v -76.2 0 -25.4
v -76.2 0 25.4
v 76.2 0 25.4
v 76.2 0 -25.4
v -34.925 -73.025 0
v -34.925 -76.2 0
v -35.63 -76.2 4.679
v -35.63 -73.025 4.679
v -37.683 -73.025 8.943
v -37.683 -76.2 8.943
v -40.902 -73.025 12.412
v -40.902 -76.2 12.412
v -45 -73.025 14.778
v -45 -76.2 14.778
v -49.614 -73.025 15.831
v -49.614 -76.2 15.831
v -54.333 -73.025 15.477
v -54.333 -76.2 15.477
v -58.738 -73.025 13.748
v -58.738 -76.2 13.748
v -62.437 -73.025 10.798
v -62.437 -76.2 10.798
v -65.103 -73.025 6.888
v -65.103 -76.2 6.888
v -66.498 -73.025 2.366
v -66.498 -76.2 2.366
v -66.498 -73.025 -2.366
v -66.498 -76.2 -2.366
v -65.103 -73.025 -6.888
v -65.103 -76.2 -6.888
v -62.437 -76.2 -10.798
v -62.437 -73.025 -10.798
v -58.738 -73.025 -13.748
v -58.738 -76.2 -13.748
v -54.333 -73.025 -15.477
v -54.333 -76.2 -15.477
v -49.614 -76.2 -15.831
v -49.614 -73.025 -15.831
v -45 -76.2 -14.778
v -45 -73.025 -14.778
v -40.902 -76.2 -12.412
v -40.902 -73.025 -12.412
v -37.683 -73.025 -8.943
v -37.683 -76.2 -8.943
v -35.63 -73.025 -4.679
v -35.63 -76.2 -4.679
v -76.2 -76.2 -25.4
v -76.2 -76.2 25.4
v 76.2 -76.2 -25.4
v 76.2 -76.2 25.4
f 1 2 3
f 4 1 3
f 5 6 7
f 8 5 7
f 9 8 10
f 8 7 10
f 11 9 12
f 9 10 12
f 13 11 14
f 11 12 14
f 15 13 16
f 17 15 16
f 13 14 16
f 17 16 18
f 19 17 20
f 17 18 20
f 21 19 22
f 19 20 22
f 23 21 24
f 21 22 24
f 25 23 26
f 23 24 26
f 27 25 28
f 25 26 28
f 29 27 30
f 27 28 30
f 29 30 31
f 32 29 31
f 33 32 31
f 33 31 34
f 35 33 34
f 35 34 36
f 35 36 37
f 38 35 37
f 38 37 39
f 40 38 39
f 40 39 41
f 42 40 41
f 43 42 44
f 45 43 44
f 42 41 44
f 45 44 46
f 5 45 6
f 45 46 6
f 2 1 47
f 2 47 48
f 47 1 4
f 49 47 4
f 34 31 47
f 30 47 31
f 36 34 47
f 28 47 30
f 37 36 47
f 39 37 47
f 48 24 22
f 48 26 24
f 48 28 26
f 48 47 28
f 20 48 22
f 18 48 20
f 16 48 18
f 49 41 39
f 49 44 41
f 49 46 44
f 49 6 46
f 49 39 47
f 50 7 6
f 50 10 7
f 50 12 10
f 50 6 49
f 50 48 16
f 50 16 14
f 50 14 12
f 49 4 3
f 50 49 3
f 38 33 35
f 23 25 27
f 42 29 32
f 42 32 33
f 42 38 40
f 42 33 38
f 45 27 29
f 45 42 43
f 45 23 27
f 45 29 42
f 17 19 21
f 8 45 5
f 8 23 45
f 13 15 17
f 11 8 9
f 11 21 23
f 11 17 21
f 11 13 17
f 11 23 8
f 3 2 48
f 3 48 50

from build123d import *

# Parameters (mm, degrees)
F0_W     = 152.4
F0_H     = 50.8
F1_DEPTH = 76.2
F3_DEPTH = 3.175


with BuildPart() as f1:
    # F0 (on Front) → F1 (new body)
    with BuildSketch(Plane.XZ):
        Rectangle(F0_W, F0_H)
    extrude(amount=F1_DEPTH)

    # F2 (on face) → F3 (cut)
    with BuildSketch(Plane.XZ.offset(76.2)):
        with BuildLine():
            ThreePointArc((-66.675, 0), (-50.8, -15.875), (-34.925, 0))
            ThreePointArc((-34.925, 0), (-50.8, 15.875), (-66.675, 0))
        make_face()
    extrude(amount=-F3_DEPTH, mode=Mode.SUBTRACT)


solid = f1.part
